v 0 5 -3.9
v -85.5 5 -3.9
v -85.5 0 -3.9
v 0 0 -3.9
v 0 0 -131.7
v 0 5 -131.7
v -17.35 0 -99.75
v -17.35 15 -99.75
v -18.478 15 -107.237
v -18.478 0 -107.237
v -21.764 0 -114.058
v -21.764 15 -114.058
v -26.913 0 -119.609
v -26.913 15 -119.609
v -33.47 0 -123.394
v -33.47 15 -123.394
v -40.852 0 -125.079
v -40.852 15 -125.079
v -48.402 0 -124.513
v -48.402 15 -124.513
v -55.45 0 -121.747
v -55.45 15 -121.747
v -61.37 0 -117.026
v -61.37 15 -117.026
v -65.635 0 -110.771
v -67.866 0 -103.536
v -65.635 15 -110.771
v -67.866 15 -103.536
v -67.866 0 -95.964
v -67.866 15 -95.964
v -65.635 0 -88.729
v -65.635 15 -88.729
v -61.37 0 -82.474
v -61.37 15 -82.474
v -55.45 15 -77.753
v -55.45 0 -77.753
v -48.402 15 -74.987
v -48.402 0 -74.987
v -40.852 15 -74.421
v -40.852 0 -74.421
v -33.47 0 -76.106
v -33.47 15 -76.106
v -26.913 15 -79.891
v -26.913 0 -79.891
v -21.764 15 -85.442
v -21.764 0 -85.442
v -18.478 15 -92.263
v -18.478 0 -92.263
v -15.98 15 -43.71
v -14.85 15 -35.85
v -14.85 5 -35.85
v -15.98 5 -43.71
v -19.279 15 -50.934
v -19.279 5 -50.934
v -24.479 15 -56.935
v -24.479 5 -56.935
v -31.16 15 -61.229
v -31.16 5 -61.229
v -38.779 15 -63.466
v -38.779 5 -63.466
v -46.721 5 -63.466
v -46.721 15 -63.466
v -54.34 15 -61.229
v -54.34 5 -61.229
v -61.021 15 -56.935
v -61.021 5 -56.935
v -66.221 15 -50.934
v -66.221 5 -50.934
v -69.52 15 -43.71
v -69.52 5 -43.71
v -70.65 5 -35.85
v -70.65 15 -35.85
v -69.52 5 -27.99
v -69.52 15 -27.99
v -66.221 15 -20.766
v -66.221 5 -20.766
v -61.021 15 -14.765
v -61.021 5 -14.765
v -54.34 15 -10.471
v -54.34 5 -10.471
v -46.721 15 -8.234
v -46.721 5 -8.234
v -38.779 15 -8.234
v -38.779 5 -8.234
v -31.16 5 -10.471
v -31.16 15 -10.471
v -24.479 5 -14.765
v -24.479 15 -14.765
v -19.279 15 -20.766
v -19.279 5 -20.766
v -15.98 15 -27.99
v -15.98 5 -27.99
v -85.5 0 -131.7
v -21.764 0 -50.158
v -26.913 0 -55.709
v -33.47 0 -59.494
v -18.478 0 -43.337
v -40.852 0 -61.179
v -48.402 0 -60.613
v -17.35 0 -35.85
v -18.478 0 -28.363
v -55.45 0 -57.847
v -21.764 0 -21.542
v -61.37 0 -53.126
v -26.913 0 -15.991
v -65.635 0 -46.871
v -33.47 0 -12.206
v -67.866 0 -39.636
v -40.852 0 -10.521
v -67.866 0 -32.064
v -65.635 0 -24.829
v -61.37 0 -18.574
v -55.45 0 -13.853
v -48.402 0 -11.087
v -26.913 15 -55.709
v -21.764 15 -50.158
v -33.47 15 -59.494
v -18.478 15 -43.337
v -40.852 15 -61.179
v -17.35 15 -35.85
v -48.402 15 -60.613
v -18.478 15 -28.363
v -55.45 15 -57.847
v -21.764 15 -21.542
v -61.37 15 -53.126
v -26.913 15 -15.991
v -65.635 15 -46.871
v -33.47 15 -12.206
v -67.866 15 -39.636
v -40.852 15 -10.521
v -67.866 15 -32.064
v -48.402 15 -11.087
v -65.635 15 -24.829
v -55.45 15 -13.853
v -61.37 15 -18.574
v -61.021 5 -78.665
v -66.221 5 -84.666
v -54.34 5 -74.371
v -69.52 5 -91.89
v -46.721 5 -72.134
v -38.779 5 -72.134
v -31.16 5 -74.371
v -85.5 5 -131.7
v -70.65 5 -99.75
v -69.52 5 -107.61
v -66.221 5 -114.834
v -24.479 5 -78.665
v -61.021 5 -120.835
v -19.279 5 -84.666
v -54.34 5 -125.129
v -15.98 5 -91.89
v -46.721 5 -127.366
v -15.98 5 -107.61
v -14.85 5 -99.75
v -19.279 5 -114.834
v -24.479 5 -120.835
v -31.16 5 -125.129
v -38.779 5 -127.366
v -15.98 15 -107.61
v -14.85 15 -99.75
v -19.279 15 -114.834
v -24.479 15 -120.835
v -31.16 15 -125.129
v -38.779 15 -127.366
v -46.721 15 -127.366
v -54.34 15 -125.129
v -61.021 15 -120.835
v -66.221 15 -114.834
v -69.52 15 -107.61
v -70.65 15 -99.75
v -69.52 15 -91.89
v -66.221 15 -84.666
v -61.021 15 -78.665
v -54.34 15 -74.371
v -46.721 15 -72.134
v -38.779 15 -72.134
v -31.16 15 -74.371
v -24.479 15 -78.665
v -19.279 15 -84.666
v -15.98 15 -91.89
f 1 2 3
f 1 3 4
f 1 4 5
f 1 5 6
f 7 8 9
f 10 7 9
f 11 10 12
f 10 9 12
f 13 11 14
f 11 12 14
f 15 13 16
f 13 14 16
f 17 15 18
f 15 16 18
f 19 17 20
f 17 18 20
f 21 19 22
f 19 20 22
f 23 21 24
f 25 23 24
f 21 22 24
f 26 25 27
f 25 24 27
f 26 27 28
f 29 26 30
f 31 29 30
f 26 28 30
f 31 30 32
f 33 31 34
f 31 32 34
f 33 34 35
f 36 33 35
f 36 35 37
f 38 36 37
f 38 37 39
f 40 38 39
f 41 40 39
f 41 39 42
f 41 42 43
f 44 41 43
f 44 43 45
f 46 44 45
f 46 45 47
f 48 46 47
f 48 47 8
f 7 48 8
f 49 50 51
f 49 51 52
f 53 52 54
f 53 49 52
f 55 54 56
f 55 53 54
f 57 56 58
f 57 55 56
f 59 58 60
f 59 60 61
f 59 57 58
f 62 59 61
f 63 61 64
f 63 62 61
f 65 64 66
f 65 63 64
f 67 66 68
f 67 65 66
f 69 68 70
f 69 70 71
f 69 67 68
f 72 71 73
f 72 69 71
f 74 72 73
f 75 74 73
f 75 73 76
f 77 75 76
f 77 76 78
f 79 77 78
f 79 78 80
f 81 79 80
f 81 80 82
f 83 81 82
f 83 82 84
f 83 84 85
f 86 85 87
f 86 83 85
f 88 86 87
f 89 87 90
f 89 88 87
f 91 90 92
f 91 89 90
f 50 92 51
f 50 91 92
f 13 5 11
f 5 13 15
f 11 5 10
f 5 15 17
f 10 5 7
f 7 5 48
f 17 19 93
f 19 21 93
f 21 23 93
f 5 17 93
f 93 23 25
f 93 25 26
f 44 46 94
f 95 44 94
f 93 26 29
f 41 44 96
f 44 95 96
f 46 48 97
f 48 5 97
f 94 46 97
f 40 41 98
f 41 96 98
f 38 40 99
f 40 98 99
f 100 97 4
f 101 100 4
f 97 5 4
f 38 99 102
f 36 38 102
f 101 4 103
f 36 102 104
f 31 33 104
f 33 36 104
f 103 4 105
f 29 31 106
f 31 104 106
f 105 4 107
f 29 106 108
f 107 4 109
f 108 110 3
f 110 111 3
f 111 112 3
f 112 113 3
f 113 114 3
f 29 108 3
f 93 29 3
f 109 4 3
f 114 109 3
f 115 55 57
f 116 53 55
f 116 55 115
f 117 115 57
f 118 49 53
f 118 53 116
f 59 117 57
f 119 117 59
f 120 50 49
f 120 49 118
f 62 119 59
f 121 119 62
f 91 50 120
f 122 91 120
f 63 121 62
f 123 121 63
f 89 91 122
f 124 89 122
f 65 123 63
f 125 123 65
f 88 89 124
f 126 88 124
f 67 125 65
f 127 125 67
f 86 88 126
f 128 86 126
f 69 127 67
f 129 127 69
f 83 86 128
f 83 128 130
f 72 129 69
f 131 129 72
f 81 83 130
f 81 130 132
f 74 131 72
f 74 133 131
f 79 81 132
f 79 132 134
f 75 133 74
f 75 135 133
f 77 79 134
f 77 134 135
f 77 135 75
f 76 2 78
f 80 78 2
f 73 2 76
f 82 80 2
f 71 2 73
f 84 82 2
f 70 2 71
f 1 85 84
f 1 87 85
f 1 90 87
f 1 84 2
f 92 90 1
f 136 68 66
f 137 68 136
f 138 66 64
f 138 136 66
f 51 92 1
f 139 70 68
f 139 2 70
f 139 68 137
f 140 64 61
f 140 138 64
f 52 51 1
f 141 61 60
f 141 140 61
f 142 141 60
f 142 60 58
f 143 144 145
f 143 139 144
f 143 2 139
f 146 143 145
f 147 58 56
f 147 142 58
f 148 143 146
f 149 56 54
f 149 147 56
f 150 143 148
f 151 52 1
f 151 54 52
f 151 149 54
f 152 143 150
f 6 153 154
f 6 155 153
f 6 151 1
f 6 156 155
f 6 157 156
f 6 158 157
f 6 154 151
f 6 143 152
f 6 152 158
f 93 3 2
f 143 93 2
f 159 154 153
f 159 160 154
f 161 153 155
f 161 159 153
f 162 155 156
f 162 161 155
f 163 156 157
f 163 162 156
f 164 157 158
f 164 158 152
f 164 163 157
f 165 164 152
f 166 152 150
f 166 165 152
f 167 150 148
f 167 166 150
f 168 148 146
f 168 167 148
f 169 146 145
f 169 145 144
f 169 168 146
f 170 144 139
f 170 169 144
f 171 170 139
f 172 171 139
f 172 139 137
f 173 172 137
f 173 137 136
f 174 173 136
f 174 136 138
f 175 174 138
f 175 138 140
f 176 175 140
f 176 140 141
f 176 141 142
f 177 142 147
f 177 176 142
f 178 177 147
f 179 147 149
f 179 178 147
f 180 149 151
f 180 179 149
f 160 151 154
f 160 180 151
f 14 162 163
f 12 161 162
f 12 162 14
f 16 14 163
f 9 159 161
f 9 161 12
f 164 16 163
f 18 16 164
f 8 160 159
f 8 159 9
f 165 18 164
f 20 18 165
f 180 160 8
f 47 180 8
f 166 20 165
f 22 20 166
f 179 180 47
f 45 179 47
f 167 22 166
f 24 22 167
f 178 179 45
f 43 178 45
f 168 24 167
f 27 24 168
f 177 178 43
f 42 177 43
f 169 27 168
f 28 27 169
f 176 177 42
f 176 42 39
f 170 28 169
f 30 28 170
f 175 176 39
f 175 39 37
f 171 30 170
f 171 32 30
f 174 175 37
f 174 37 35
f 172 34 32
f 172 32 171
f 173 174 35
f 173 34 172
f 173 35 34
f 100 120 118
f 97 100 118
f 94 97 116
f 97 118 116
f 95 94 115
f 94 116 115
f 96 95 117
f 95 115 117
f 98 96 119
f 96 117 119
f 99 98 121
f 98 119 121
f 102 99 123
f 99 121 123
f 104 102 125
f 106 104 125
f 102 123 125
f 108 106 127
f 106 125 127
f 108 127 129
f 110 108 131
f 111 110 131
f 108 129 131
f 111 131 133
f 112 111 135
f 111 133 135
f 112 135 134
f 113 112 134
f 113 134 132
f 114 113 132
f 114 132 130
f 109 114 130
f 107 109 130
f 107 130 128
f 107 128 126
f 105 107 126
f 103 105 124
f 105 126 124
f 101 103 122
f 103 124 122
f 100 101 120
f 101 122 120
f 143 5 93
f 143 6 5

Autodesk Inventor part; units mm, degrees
ref_plane "YZ Plane" through (0, 0, 0) normal (1, 0, 0) x (0, 1, 0)
ref_plane "XZ Plane" through (0, 0, 0) normal (0, 1, 0) x (-1, 0, 0)
ref_plane "XY Plane" through (0, 0, 0) normal (0, 0, 1) x (1, 0, 0)
sketch "Sketch1" plane through (0, 0, 0) normal (0, 1, 0) x (-1, 0, 0)
  point P0 (0, 0)
sketch "Sketch2" plane through (0, 0, 0) normal (0, 1, 0) x (-1, 0, 0)
  line L0 (0, 0) -> (85.5, 0)
  line L1 (85.5, 0) -> (85.5, -127.8)
  line L2 (85.5, -127.8) -> (0, -127.8)
  line L3 (0, -127.8) -> (0, 0)
  dimension "d0" = 85.5
  dimension "d1" = 127.8
extrude "Extrusion1" add sketch "Sketch2" along normal blind 5
sketch "Sketch3" plane through (0, 5, 0) normal (0, 1, 0) x (1, 0, 0)
  line L0 (-85.5, 127.8) -> (-85.5, 0) projected
  line L1 (-85.5, 0) -> (0, 0)
  line L2 (0, 0) -> (0, 127.8)
  line L3 (0, 127.8) -> (-85.5, 127.8)
  line L4 (-85.5, 127.8) -> (-85.5, 0)
  line L5 (-2.4, 2.4) -> (-83.1, 2.4)
  line L6 (-83.1, 2.4) -> (-83.1, 125.4)
  line L7 (-83.1, 125.4) -> (-2.4, 125.4)
  line L8 (-2.4, 125.4) -> (-2.4, 2.4)
  dimension "d6" = 80.7
  dimension "d7" = 123
extrude "Extrusion2" add sketch "Sketch3" along normal blind 120
sketch "Sketch4" plane through (0, 0, 0) normal (1, 0, 0) x (0, 0, -1)
  line L0 (10, 10) -> (117.8, 10)
  line L1 (117.8, 10) -> (117.8, 115)
  line L2 (117.8, 115) -> (10, 115)
  line L3 (10, 115) -> (10, 10)
  point P0 (0, 0)
  dimension "d10" = 107.8
  dimension "d11" = 105
extrude "Extrusion3" cut sketch "Sketch4" against normal blind 500
sketch "Sketch5" plane through (0, 0, -127.8) normal (0, 0, -1) x (-1, 0, 0)
  line L0 (10, 10) -> (75.5, 10)
  line L1 (75.5, 10) -> (75.5, 115)
  line L2 (75.5, 115) -> (10, 115)
  line L3 (10, 115) -> (10, 10)
  point P0 (0, 0)
  dimension "d14" = 65.5
  dimension "d15" = 105
extrude "Extrusion4" cut sketch "Sketch5" against normal blind 500
sketch "Sketch6" plane through (-85.5, 0, -127.8) normal (-1, 0, 0) x (0, 0, 1)
  line L0 (2.4, 125) -> (125.4, 125) projected
  line L1 (63.9, 125) -> (63.9, 0)
  line L2 (0, 0) -> (127.8, 0) projected
  line L3 (63.9, 125) -> (58.9, 125)
  line L4 (58.9, 125) -> (58.9, 0)
  line L5 (58.9, 0) -> (63.9, 0)
  line L6 (63.9, 0) -> (63.9, 125)
  line L7 (63.9, 125) -> (68.9, 125)
  line L8 (68.9, 125) -> (68.9, 0)
  line L9 (68.9, 0) -> (63.9, 0)
  line L10 (63.9, 0) -> (63.9, 125)
  dimension "d18" = 5
  dimension "d19" = 5
extrude "Extrusion5" add sketch "Sketch6" against normal blind 2.4
sketch "Sketch7" plane through (0, 0, 0) normal (1, 0, 0) x (0, 0, -1)
  line L0 (117.8, 115) -> (10, 115) projected
  line L1 (63.9, 115) -> (63.9, 10)
  line L2 (10, 10) -> (117.8, 10) projected
  line L3 (58.9, 10) -> (58.9, 115) projected
  line L4 (117.8, 10) -> (68.9, 10) projected
  line L5 (58.9, 115) -> (68.9, 115)
  line L6 (68.9, 115) -> (68.9, 10)
  line L7 (68.9, 10) -> (58.9, 10)
  line L8 (58.9, 10) -> (58.9, 115)
  point P0 (0, 0)
extrude "Extrusion6" add sketch "Sketch7" against normal blind 2.4
sketch "Sketch8" plane through (0, 0, -127.8) normal (0, 0, -1) x (-1, 0, 0)
  line L0 (10, 100) -> (25, 115)
  line L1 (10, 115) -> (75.5, 115) projected
  line L2 (10, 100) -> (31.2132, 100) construction
  line L3 (75.5, 100) -> (60.5, 115)
  line L4 (75.5, 100) -> (96.7132, 100) construction
  line L5 (10, 10) -> (10, 115) projected
  line L6 (10, 25) -> (25, 10)
  line L7 (10, 10) -> (75.5, 10) projected
  line L8 (10, 25) -> (31.2132, 25) construction
  line L9 (75.5, 115) -> (75.5, 10) projected
  line L10 (75.5, 25) -> (60.5, 10)
  line L11 (10, 115) -> (75.5, 115)
  line L12 (75.5, 115) -> (75.5, 10)
  line L13 (75.5, 10) -> (10, 10)
  line L14 (10, 10) -> (10, 115)
  point P0 (0, 0)
  dimension "d24" = 45
  dimension "d25" = 135
  dimension "d26" = 45
extrude "Extrusion7" add sketch "Sketch8" against normal blind 2.4 contours L5 L1 L0 | L6 L7 L5 | L1 L9 L3 | L10 L9 L7
sketch "Sketch9" plane through (-85.5, 0, 0) normal (0, 0, 1) x (1, 0, 0)
  line L0 (10, 25) -> (10, 100) projected
  line L1 (25, 115) -> (60.5, 115) projected
  line L2 (10, 100) -> (25, 115)
  line L3 (60.5, 115) -> (75.5, 100) projected
  line L4 (25, 115) -> (60.5, 115)
  line L5 (60.5, 115) -> (75.5, 100)
  line L6 (75.5, 100) -> (75.5, 25) projected
  line L7 (75.5, 100) -> (75.5, 25)
  line L8 (75.5, 25) -> (60.5, 10)
  line L9 (25, 10) -> (60.5, 10) projected
  line L10 (10, 25) -> (25, 10) projected
  line L11 (25, 10) -> (10, 25)
  line L12 (10, 25) -> (10, 100)
  line L13 (10, 115) -> (75.5, 115)
  line L14 (75.5, 115) -> (75.5, 10)
  line L15 (75.5, 10) -> (10, 10)
  line L16 (10, 10) -> (10, 115)
  point P0 (85.5, 0)
  point P1 (60.5, 10)
extrude "Extrusion8" add sketch "Sketch9" against normal blind 2.4 contours L10 L15 L16 | L16 L13 L2 | L8 L14 L15 | L13 L14 L3
sketch "Sketch10" plane through (0, 0, 0) normal (1, 0, 0) x (0, 0, -1)
  line L0 (10, 115) -> (10, 10) projected
  line L1 (10, 100) -> (25, 115)
  line L2 (58.9, 115) -> (10, 115) projected
  line L3 (10, 100) -> (31.2132, 100) construction
  line L4 (58.9, 10) -> (58.9, 115) projected
  line L5 (58.9, 100) -> (43.9, 115)
  line L6 (58.9, 25) -> (43.9, 10)
  line L7 (10, 10) -> (58.9, 10) projected
  line L8 (10, 25) -> (25, 10)
  line L9 (68.9, 100) -> (83.9, 115)
  line L10 (68.9, 115) -> (117.8, 115) projected
  line L11 (68.9, 100) -> (90.1132, 100) construction
  line L12 (117.8, 115) -> (117.8, 10) projected
  line L13 (117.8, 100) -> (102.8, 115)
  line L14 (117.8, 25) -> (102.8, 10)
  line L15 (117.8, 10) -> (68.9, 10) projected
  line L16 (68.9, 25) -> (83.9, 10)
  line L17 (10, 115) -> (58.9, 115)
  line L18 (58.9, 115) -> (58.9, 10)
  line L19 (58.9, 10) -> (10, 10)
  line L20 (10, 10) -> (10, 115)
  line L21 (68.9, 115) -> (117.8, 115)
  line L22 (117.8, 115) -> (117.8, 10)
  line L23 (117.8, 10) -> (68.9, 10)
  line L24 (68.9, 10) -> (68.9, 115)
  point P0 (0, 0)
  dimension "d31" = 45
  dimension "d32" = 45
extrude "Extrusion9" add sketch "Sketch10" against normal blind 2.4 contours L2 L1 L0 | L8 L7 L0 | L2 L4 L5 | L6 L4 L7 | L24 L10 L9 | L16 L15 L24 | L10 L12 L13 | L14 L12 L15
sketch "Sketch11" plane through (-85.5, 0, -127.8) normal (-1, 0, 0) x (0, 0, 1)
  line L0 (10, 100) -> (25, 115) projected
  line L1 (10, 100) -> (25, 115)
  line L2 (25, 115) -> (43.9, 115) projected
  line L3 (25, 115) -> (43.9, 115)
  line L4 (43.9, 115) -> (58.9, 100)
  line L5 (58.9, 100) -> (58.9, 25)
  line L6 (58.9, 25) -> (43.9, 10) projected
  line L7 (10, 10) -> (58.9, 10) projected
  line L8 (25, 10) -> (10, 25) projected
  line L9 (43.9, 10) -> (25, 10)
  line L10 (25, 10) -> (10, 25)
  line L11 (10, 25) -> (10, 100)
  line L12 (10, 115) -> (10, 10) projected
  line L13 (68.9, 25) -> (68.9, 100) projected
  line L14 (83.9, 115) -> (102.8, 115) projected
  line L15 (68.9, 100) -> (83.9, 115)
  line L16 (83.9, 115) -> (102.8, 115)
  line L17 (102.8, 115) -> (117.8, 100)
  line L18 (117.8, 25) -> (102.8, 10) projected
  line L19 (117.8, 100) -> (117.8, 25)
  line L20 (117.8, 25) -> (102.8, 10)
  line L21 (83.9, 10) -> (102.8, 10) projected
  line L22 (102.8, 10) -> (83.9, 10)
  line L23 (83.9, 10) -> (68.9, 25)
  line L24 (68.9, 25) -> (68.9, 100)
  line L25 (10, 115) -> (58.9, 115)
  line L26 (58.9, 115) -> (58.9, 10)
  line L27 (58.9, 10) -> (10, 10)
  line L28 (10, 10) -> (10, 115)
  line L29 (68.9, 115) -> (117.8, 115)
  line L30 (117.8, 115) -> (117.8, 10)
  line L31 (117.8, 10) -> (68.9, 10)
  line L32 (68.9, 10) -> (68.9, 115)
  point P0 (127.8, 0)
extrude "Extrusion10" add sketch "Sketch11" against normal blind 2.4 contours L12 L25 L0 | L8 L7 L12 | L25 L26 L4 | L6 L26 L7 | L23 L31 L32 | L32 L29 L15 | L18 L30 L31 | L29 L30 L17
sketch "Sketch12" plane through (0, 125, 0) normal (0, 1, 0) x (1, 0, 0)
  line L0 (-83.1, 125.4) -> (-2.4, 125.4) projected
  line L1 (-83.1, 125.4) -> (-83.1, 2.4) projected
  line L2 (-2.4, 125.4) -> (-83.1, 125.4)
  line L3 (-83.1, 125.4) -> (-83.1, 2.4)
  line L4 (-83.1, 2.4) -> (-2.4, 2.4)
  line L5 (-2.4, 2.4) -> (-2.4, 125.4)
  point P0 (0, 0)
extrude "Extrusion11" add sketch "Sketch12" against normal blind 4.8
sketch "Sketch13" plane through (0, 125, 0) normal (0, 1, 0) x (1, 0, 0)
  line L0 (-2.4, 2.4) -> (-2.4, 125.4) projected
  line L1 (-83.1, 125.4) -> (-83.1, 2.4) projected
  line L2 (-2.4, 125.4) -> (-83.1, 125.4)
  line L3 (-83.1, 125.4) -> (-83.1, 2.4)
  line L4 (-83.1, 2.4) -> (-2.4, 2.4)
  line L5 (-2.4, 2.4) -> (-2.4, 125.4)
  point P0 (0, 0)
extrude "Extrusion12" cut sketch "Sketch13" against normal blind 2.4
sketch "Sketch14" plane through (0, 122.6, 0) normal (0, 1, 0) x (1, 0, 0)
  line L0 (-80.1, 122.4) -> (-5.4, 122.4)
  line L1 (-5.4, 122.4) -> (-5.4, 5.4)
  line L2 (-5.4, 5.4) -> (-80.1, 5.4)
  line L3 (-80.1, 5.4) -> (-80.1, 122.4)
  point P0 (0, 0)
  dimension "d41" = 74.7
  dimension "d42" = 117
extrude "Extrusion13" cut sketch "Sketch14" against normal blind 10
sketch "Sketch15" plane through (0, 0, 0) normal (1, 0, 0) x (0, 0, -1)
  line L0 (127.8, 0) -> (127.8, 125) projected
  line L1 (0, 125) -> (127.8, 125)
  line L2 (127.8, 125) -> (127.8, 119)
  line L3 (127.8, 119) -> (0, 119)
  line L4 (0, 119) -> (0, 125)
  line L5 (127.8, 125) -> (0, 125) projected
  line L6 (63.9, 125) -> (88.9, 125)
  line L7 (88.9, 125) -> (88.9, 119)
  line L8 (88.9, 119) -> (63.9, 119)
  line L9 (63.9, 119) -> (63.9, 125)
  line L10 (63.9, 125) -> (38.9, 125)
  line L11 (38.9, 125) -> (38.9, 119)
  line L12 (38.9, 119) -> (63.9, 119)
  line L13 (63.9, 119) -> (63.9, 125)
  point P0 (0, 0)
  dimension "d45" = 6
  dimension "d46" = 25
  dimension "d47" = 25
extrude "Extrusion14" cut sketch "Sketch15" against normal blind 100 contours L3 L9 L1 L7 | L3 L11 L1 L9
sketch "Sketch16" plane through (0, 0, -127.8) normal (0, 0, -1) x (-1, 0, 0)
  line L0 (0, 125) -> (0, 119) projected
  line L1 (85.5, 0) -> (85.5, 125) projected
  line L2 (0, 125) -> (85.5, 125)
  line L3 (85.5, 125) -> (85.5, 119)
  line L4 (85.5, 119) -> (0, 119)
  line L5 (0, 119) -> (0, 125)
  line L6 (0, 125) -> (85.5, 125) projected
  line L7 (42.75, 125) -> (67.75, 125)
  line L8 (67.75, 125) -> (67.75, 119)
  line L9 (67.75, 119) -> (42.75, 119)
  line L10 (42.75, 119) -> (42.75, 125)
  line L11 (42.75, 125) -> (17.75, 125)
  line L12 (17.75, 125) -> (17.75, 119)
  line L13 (17.75, 119) -> (42.75, 119)
  line L14 (42.75, 119) -> (42.75, 125)
  point P0 (0, 0)
  dimension "d50" = 6
  dimension "d51" = 25
  dimension "d52" = 25
extrude "Extrusion15" cut sketch "Sketch16" against normal blind 200 contours L2 L10 L4 L12 | L2 L8 L4 L10
sketch "Sketch17" plane through (-85.5, 0, 0) normal (0, 0, 1) x (1, 0, 0)
  line L0 (17.75, 119) -> (67.75, 119)
  line L1 (67.75, 119) -> (67.75, 118)
  line L2 (67.75, 118) -> (17.75, 118)
  line L3 (17.75, 118) -> (17.75, 119)
  point P0 (85.5, 0)
  dimension "d55" = 1
extrude "Extrusion16" cut sketch "Sketch17" against normal blind 200
sketch "Sketch18" plane through (0, 0, 0) normal (1, 0, 0) x (0, 0, -1)
  line L0 (38.9, 119) -> (38.9, 120.2) projected
  line L1 (38.9, 119) -> (88.9, 119)
  line L2 (88.9, 119) -> (88.9, 118)
  line L3 (88.9, 118) -> (38.9, 118)
  line L4 (38.9, 118) -> (38.9, 119)
  point P0 (0, 0)
  dimension "d58" = 1
extrude "Extrusion17" cut sketch "Sketch18" against normal blind 200
sketch "Sketch19" plane through (0, 0, -127.8) normal (0, 0, -1) x (-1, 0, 0)
  line L0 (17.75, 118) -> (67.75, 118) projected
  line L1 (17.75, 118) -> (67.75, 118)
  line L2 (67.75, 118) -> (67.75, 112)
  line L3 (67.75, 112) -> (17.75, 112)
  line L4 (17.75, 112) -> (17.75, 118)
  point P0 (0, 0)
  dimension "d61" = 50
  dimension "d62" = 6
extrude "Extrusion18" add sketch "Sketch19" against normal blind 2.4
sketch "Sketch20" plane through (-85.5, 0, -127.8) normal (-1, 0, 0) x (0, 0, 1)
  line L0 (2.4, 118) -> (0, 118) projected
  line L1 (127.8, 100) -> (127.8, 115) projected
  line L2 (0, 118) -> (127.8, 118)
  line L3 (127.8, 118) -> (127.8, 112)
  line L4 (127.8, 112) -> (0, 112)
  line L5 (0, 112) -> (0, 118)
  point P0 (127.8, 0)
  dimension "d65" = 6
extrude "Extrusion19" add sketch "Sketch20" against normal blind 2.4
sketch "Sketch21" plane through (-85.5, 0, 0) normal (0, 0, 1) x (1, 0, 0)
  line L0 (17.75, 118) -> (67.75, 118) projected
  line L1 (17.75, 118) -> (67.75, 118)
  line L2 (67.75, 118) -> (67.75, 112)
  line L3 (67.75, 112) -> (17.75, 112)
  line L4 (17.75, 112) -> (17.75, 118)
  point P0 (85.5, 0)
  dimension "d68" = 6
extrude "Extrusion20" add sketch "Sketch21" against normal blind 2.4
sketch "Sketch22" plane through (0, 0, 0) normal (1, 0, 0) x (0, 0, -1)
  line L0 (127.8, 0) -> (127.8, 125) projected
  line L1 (0, 118) -> (127.8, 118)
  line L2 (127.8, 118) -> (127.8, 112)
  line L3 (127.8, 112) -> (0, 112)
  line L4 (0, 112) -> (0, 118)
  point P0 (0, 0)
  dimension "d71" = 6
extrude "Extrusion21" add sketch "Sketch22" against normal blind 2.4
sketch "Sketch23" plane through (0, 125, 0) normal (0, 1, 0) x (1, 0, 0)
  line L0 (-85.5, 127.8) -> (-85.5, 0) projected
  line L1 (-85.5, 127.8) -> (0, 127.8)
  line L2 (0, 127.8) -> (0, 0)
  line L3 (0, 0) -> (-85.5, 0)
  line L4 (-85.5, 0) -> (-85.5, 127.8)
extrude "Extrusion22" cut sketch "Sketch23" against normal blind 120
sketch "Sketch24" plane through (0, 5, 0) normal (0, 1, 0) x (1, 0, 0)
  line L0 (0, 127.8) -> (-85.5, 127.8) projected
  line L1 (-42.75, 127.8) -> (-42.75, 0)
  line L2 (-85.5, 0) -> (0, 0) projected
  line L3 (-85.5, 127.8) -> (-85.5, 0) projected
  line L4 (-85.5, 63.9) -> (0, 63.9)
  line L5 (0, 0) -> (0, 127.8) projected
  line L6 (-42.75, 63.9) -> (-36.25, 63.9)
  line L7 (-36.25, 63.9) -> (-36.25, 70.4)
  line L8 (-36.25, 70.4) -> (-42.75, 70.4)
  line L9 (-42.75, 70.4) -> (-42.75, 63.9)
  line L10 (-36.25, 70.4) -> (-49.25, 70.4)
  line L11 (-49.25, 70.4) -> (-49.25, 57.4)
  line L12 (-49.25, 57.4) -> (-36.25, 57.4)
  line L13 (-36.25, 57.4) -> (-36.25, 70.4)
  line L14 (-42.75, 63.9) -> (-34.75, 63.9)
  line L15 (-34.75, 63.9) -> (-34.75, 71.9)
  line L16 (-34.75, 71.9) -> (-42.75, 71.9)
  line L17 (-42.75, 71.9) -> (-42.75, 63.9)
  line L18 (-34.75, 71.9) -> (-50.75, 71.9)
  line L19 (-50.75, 71.9) -> (-50.75, 55.9)
  line L20 (-50.75, 55.9) -> (-34.75, 55.9)
  line L21 (-34.75, 55.9) -> (-34.75, 71.9)
  dimension "d76" = 6.5
  dimension "d77" = 6.5
  dimension "d78" = 13
  dimension "d79" = 13
  dimension "d80" = 8
  dimension "d81" = 8
  dimension "d82" = 16
  dimension "d83" = 16
extrude "Extrusion23" add sketch "Sketch24" along normal blind 25 contours L16 L15 L4 L7 L8 L1 | L1 L10 L11 L4 L19 L18 | L21 L20 L1 L12 L13 L4 | L4 L11 L12 L1 L20 L19
sketch "Sketch26" plane through (0, 30, 0) normal (0, 1, 0) x (1, 0, 0)
  line L0 (-60.75, 81.9) -> (-60.75, 68.9) projected
  line L1 (-24.75, 45.9) -> (-37.75, 45.9) projected
  line L2 (-60.75, 81.9) -> (-24.75, 81.9)
  line L3 (-24.75, 81.9) -> (-24.75, 45.9)
  line L4 (-24.75, 45.9) -> (-60.75, 45.9)
  line L5 (-60.75, 45.9) -> (-60.75, 81.9)
  point P0 (0, 0)
extrude "Extrusion25" cut sketch "Sketch26" against normal blind 25
sketch "Sketch27" plane through (0, 5, 0) normal (0, 1, 0) x (1, 0, 0)
  line L0 (0, 127.8) -> (-85.5, 127.8) projected
  line L1 (-85.5, 127.8) -> (0, 127.8)
  line L2 (0, 127.8) -> (0, 0)
  line L3 (0, 0) -> (-85.5, 0)
  line L4 (-85.5, 0) -> (-85.5, 127.8)
  line L5 (-42.75, 127.8) -> (-42.75, 0)
  line L6 (0, 0) -> (0, 127.8) projected
  line L7 (-85.5, 127.8) -> (0, 127.8)
  line L8 (0, 127.8) -> (0, 117.8)
  line L9 (0, 117.8) -> (-85.5, 117.8)
  line L10 (-85.5, 117.8) -> (-85.5, 127.8)
  line L11 (-85.5, 127.8) -> (-85.5, 0) projected
  line L12 (0, 117.8) -> (-85.5, 117.8)
  line L13 (-85.5, 117.8) -> (-85.5, 97.8)
  line L14 (-85.5, 97.8) -> (0, 97.8)
  line L15 (0, 97.8) -> (0, 117.8)
  line L16 (-85.5, 97.8) -> (0, 97.8)
  line L17 (0, 97.8) -> (0, 77.8)
  line L18 (0, 77.8) -> (-85.5, 77.8)
  line L19 (-85.5, 77.8) -> (-85.5, 97.8)
  line L20 (-85.5, 77.8) -> (0, 77.8)
  line L21 (0, 77.8) -> (0, 57.8)
  line L22 (0, 57.8) -> (-85.5, 57.8)
  line L23 (-85.5, 57.8) -> (-85.5, 77.8)
  line L24 (-85.5, 57.8) -> (0, 57.8)
  line L25 (0, 57.8) -> (0, 37.8)
  line L26 (0, 37.8) -> (-85.5, 37.8)
  line L27 (-85.5, 37.8) -> (-85.5, 57.8)
  line L28 (-85.5, 37.8) -> (0, 37.8)
  line L29 (0, 37.8) -> (0, 17.8)
  line L30 (0, 17.8) -> (-85.5, 17.8)
  line L31 (-85.5, 17.8) -> (-85.5, 37.8)
  line L32 (-85.5, 127.8) -> (-42.75, 127.8)
  line L33 (0, 127.8) -> (-42.75, 127.8)
  line L34 (-64.125, 127.8) -> (-64.125, 0)
  line L35 (-85.5, 0) -> (0, 0) projected
  line L36 (-21.375, 127.8) -> (-21.375, 0)
  line L37 (-62.625, 127.8) -> (-65.625, 127.8)
  line L38 (-65.625, 127.8) -> (-65.625, 0)
  line L39 (-65.625, 0) -> (-62.625, 0)
  line L40 (-62.625, 0) -> (-62.625, 127.8)
  line L41 (-41.25, 127.8) -> (-44.25, 127.8)
  line L42 (-44.25, 127.8) -> (-44.25, 0)
  line L43 (-44.25, 0) -> (-41.25, 0)
  line L44 (-41.25, 0) -> (-41.25, 127.8)
  line L45 (-19.875, 127.8) -> (-22.875, 127.8)
  line L46 (-22.875, 127.8) -> (-22.875, 0)
  line L47 (-22.875, 0) -> (-19.875, 0)
  line L48 (-19.875, 0) -> (-19.875, 127.8)
  line L49 (-85.5, 117.8) -> (0, 117.8)
  line L50 (0, 117.8) -> (0, 120.8)
  line L51 (0, 120.8) -> (-85.5, 120.8)
  line L52 (-85.5, 120.8) -> (-85.5, 117.8)
  line L53 (-85.5, 120.8) -> (0, 120.8)
  line L54 (0, 120.8) -> (0, 114.8)
  line L55 (0, 114.8) -> (-85.5, 114.8)
  line L56 (-85.5, 114.8) -> (-85.5, 120.8)
  line L57 (-85.5, 97.8) -> (0, 97.8)
  line L58 (0, 97.8) -> (0, 100.8)
  line L59 (0, 100.8) -> (-85.5, 100.8)
  line L60 (-85.5, 100.8) -> (-85.5, 97.8)
  line L61 (0, 97.8) -> (-85.5, 97.8)
  line L62 (-85.5, 97.8) -> (-85.5, 94.8)
  line L63 (-85.5, 94.8) -> (0, 94.8)
  line L64 (0, 94.8) -> (0, 97.8)
  line L65 (-85.5, 77.8) -> (0, 77.8)
  line L66 (0, 77.8) -> (0, 80.8)
  line L67 (0, 80.8) -> (-85.5, 80.8)
  line L68 (-85.5, 80.8) -> (-85.5, 77.8)
  line L69 (0, 80.8) -> (-85.5, 80.8)
  line L70 (-85.5, 80.8) -> (-85.5, 74.8)
  line L71 (-85.5, 74.8) -> (0, 74.8)
  line L72 (0, 74.8) -> (0, 80.8)
  line L73 (-85.5, 57.8) -> (0, 57.8)
  line L74 (0, 57.8) -> (0, 60.8)
  line L75 (0, 60.8) -> (-85.5, 60.8)
  line L76 (-85.5, 60.8) -> (-85.5, 57.8)
  line L77 (0, 60.8) -> (-85.5, 60.8)
  line L78 (-85.5, 60.8) -> (-85.5, 54.8)
  line L79 (-85.5, 54.8) -> (0, 54.8)
  line L80 (0, 54.8) -> (0, 60.8)
  line L81 (-85.5, 37.8) -> (0, 37.8)
  line L82 (0, 37.8) -> (0, 40.8)
  line L83 (0, 40.8) -> (-85.5, 40.8)
  line L84 (-85.5, 40.8) -> (-85.5, 37.8)
  line L85 (-85.5, 40.8) -> (0, 40.8)
  line L86 (0, 40.8) -> (0, 34.8)
  line L87 (0, 34.8) -> (-85.5, 34.8)
  line L88 (-85.5, 34.8) -> (-85.5, 40.8)
  line L89 (-85.5, 17.8) -> (0, 17.8)
  line L90 (0, 17.8) -> (0, 20.8)
  line L91 (0, 20.8) -> (-85.5, 20.8)
  line L92 (-85.5, 20.8) -> (-85.5, 17.8)
  line L93 (0, 20.8) -> (-85.5, 20.8)
  line L94 (-85.5, 20.8) -> (-85.5, 14.8)
  line L95 (-85.5, 14.8) -> (0, 14.8)
  line L96 (0, 14.8) -> (0, 20.8)
  point P0 (-22.875, 20.8)
  point P1 (-22.875, 17.8)
  point P2 (-19.875, 17.8)
  point P3 (-19.875, 20.8)
  point P4 (-44.25, 20.8)
  point P5 (-44.25, 14.8)
  point P6 (-41.25, 14.8)
  point P7 (-41.25, 20.8)
  point P8 (-65.625, 20.8)
  point P9 (-65.625, 14.8)
  point P10 (-62.625, 14.8)
  point P11 (-62.625, 20.8)
  point P12 (-19.875, 40.8)
  point P13 (-22.875, 40.8)
  point P14 (-22.875, 34.8)
  point P15 (-19.875, 34.8)
  point P16 (-41.25, 40.8)
  point P17 (-44.25, 40.8)
  point P18 (-44.25, 34.8)
  point P19 (-41.25, 34.8)
  point P20 (-62.625, 40.8)
  point P21 (-65.625, 40.8)
  point P22 (-65.625, 34.8)
  point P23 (-62.625, 34.8)
  point P24 (-22.875, 60.8)
  point P25 (-22.875, 54.8)
  point P26 (-19.875, 54.8)
  point P27 (-19.875, 60.8)
  point P28 (-44.25, 60.8)
  point P29 (-44.25, 54.8)
  point P30 (-41.25, 54.8)
  point P31 (-41.25, 60.8)
  point P32 (-65.625, 60.8)
  point P33 (-65.625, 54.8)
  point P34 (-62.625, 54.8)
  point P35 (-62.625, 60.8)
  point P36 (-44.25, 80.8)
  point P37 (-44.25, 74.8)
  point P38 (-41.25, 74.8)
  point P39 (-41.25, 80.8)
  point P40 (-62.625, 80.8)
  point P41 (-65.625, 80.8)
  point P42 (-65.625, 74.8)
  point P43 (-62.625, 74.8)
  point P44 (-19.875, 80.8)
  point P45 (-22.875, 80.8)
  point P46 (-22.875, 74.8)
  point P47 (-19.875, 74.8)
  point P48 (-19.875, 100.8)
  point P49 (-22.875, 100.8)
  point P50 (-22.875, 94.8)
  point P51 (-19.875, 94.8)
  point P52 (-41.25, 94.8)
  point P53 (-41.25, 100.8)
  point P54 (-44.25, 100.8)
  point P55 (-44.25, 94.8)
  point P56 (-65.625, 100.8)
  point P57 (-65.625, 94.8)
  point P58 (-62.625, 94.8)
  point P59 (-62.625, 100.8)
  point P60 (-19.875, 120.8)
  point P61 (-22.875, 120.8)
  point P62 (-22.875, 114.8)
  point P63 (-19.875, 114.8)
  point P64 (-41.25, 120.8)
  point P65 (-44.25, 120.8)
  point P66 (-44.25, 114.8)
  point P67 (-41.25, 114.8)
  point P68 (-62.625, 120.8)
  point P69 (-65.625, 120.8)
  point P70 (-65.625, 114.8)
  point P71 (-62.625, 114.8)
  dimension "d100" = 10
  dimension "d101" = 20
  dimension "d102" = 20
  dimension "d103" = 20
  dimension "d104" = 20
  dimension "d105" = 20
  dimension "d106" = 3
  dimension "d107" = 3
  dimension "d108" = 3
  dimension "d109" = 3
  dimension "d110" = 6
  dimension "d111" = 3
  dimension "d112" = 3
  dimension "d113" = 3
  dimension "d114" = 6
  dimension "d115" = 3
  dimension "d116" = 85.5
  dimension "d117" = 6
  dimension "d118" = 3
  dimension "d119" = 6
  dimension "d120" = 3
  dimension "d121" = 6
extrude "Extrusion26" cut sketch "Sketch27" against normal blind 5 contours L48 L9 L36 L51 | L36 L9 L46 L51 | L48 L55 L36 L9 | L36 L55 L46 L9 | L44 L9 L5 L51 | L48 L14 L36 L59 | L5 L9 L42 L51 | L44 L55 L5 L9 | L36 L14 L46 L59 | L48 L63 L36 L14 | L5 L55 L42 L9 | L36 L63 L46 L14 | L40 L9 L34 L51 | L44 L14 L5 L59 | L48 L18 L36 L67 | L34 L9 L38 L51 | L40 L55 L34 L9 | L5 L14 L42 L59 | L44 L63 L5 L14 | L36 L18 L46 L67 | L48 L71 L36 L18 | L34 L55 L38 L9 | L5 L63 L42 L14 | L36 L71 L46 L18 | L40 L14 L34 L59 | L44 L18 L5 L67 | L48 L22 L36 L75 | L34 L14 L38 L59 | L40 L63 L34 L14 | L5 L18 L42 L67 | L44 L71 L5 L18 | L36 L22 L46 L75 | L48 L79 L36 L22 | L34 L63 L38 L14 | L5 L71 L42 L18 | L36 L79 L46 L22 | L40 L18 L34 L67 | L44 L22 L5 L75 | L48 L26 L36 L83 | L34 L18 L38 L67 | L40 L71 L34 L18 | L5 L22 L42 L75 | L44 L79 L5 L22 | L36 L26 L46 L83 | L48 L87 L36 L26 | L34 L71 L38 L18 | L5 L79 L42 L22 | L36 L87 L46 L26 | L40 L22 L34 L75 | L44 L26 L5 L83 | L48 L30 L36 L91 | L34 L22 L38 L75 | L40 L79 L34 L22 | L5 L26 L42 L83 | L44 L87 L5 L26 | L36 L30 L46 L91 | L34 L79 L38 L22 | L5 L87 L42 L26 | L40 L26 L34 L83 | L44 L30 L5 L91 | L34 L26 L38 L83 | L40 L87 L34 L26 | L5 L30 L42 L91 | L44 L95 L5 L30 | L34 L87 L38 L26 | L5 L95 L42 L30 | L40 L30 L34 L91 | L34 L30 L38 L91 | L40 L95 L34 L30 | L34 L95 L38 L30
sketch "Sketch28" plane through (0, 5, 0) normal (0, 1, 0) x (1, 0, 0)
  line L0 (-22.875, 17.8) -> (-19.875, 17.8) projected
  line L1 (-19.875, 17.8) -> (-22.875, 17.8)
  line L2 (-22.875, 17.8) -> (-22.875, 14.8)
  line L3 (-22.875, 14.8) -> (-19.875, 14.8)
  line L4 (-19.875, 14.8) -> (-19.875, 17.8)
  point P0 (0, 0)
  dimension "d124" = 3
  dimension "d125" = 3
extrude "Extrusion27" cut sketch "Sketch28" against normal blind 5
sketch "Sketch29" plane through (0, 5, 0) normal (0, 1, 0) x (1, 0, 0)
  line L0 (-22.875, 14.8) -> (-22.875, 20.8) projected
  line L1 (-22.875, 20.8) -> (-19.875, 20.8) projected
  line L2 (-19.875, 20.8) -> (-19.875, 14.8) projected
  line L3 (-19.875, 14.8) -> (-22.875, 14.8) projected
  line L4 (-19.875, 114.8) -> (-22.875, 114.8) projected
  line L5 (-22.875, 114.8) -> (-22.875, 120.8) projected
  line L6 (-22.875, 120.8) -> (-19.875, 120.8) projected
  line L7 (-19.875, 120.8) -> (-19.875, 114.8) projected
  line L8 (-19.875, 74.8) -> (-22.875, 74.8) projected
  line L9 (-22.875, 74.8) -> (-22.875, 80.8) projected
  line L10 (-22.875, 80.8) -> (-19.875, 80.8) projected
  line L11 (-19.875, 80.8) -> (-19.875, 74.8) projected
  line L12 (-41.25, 54.8) -> (-44.25, 54.8) projected
  line L13 (-44.25, 54.8) -> (-44.25, 60.8) projected
  line L14 (-44.25, 60.8) -> (-41.25, 60.8) projected
  line L15 (-41.25, 60.8) -> (-41.25, 54.8) projected
  line L16 (-19.875, 34.8) -> (-22.875, 34.8) projected
  line L17 (-22.875, 34.8) -> (-22.875, 40.8) projected
  line L18 (-22.875, 40.8) -> (-19.875, 40.8) projected
  line L19 (-19.875, 40.8) -> (-19.875, 34.8) projected
  line L20 (-41.25, 34.8) -> (-44.25, 34.8) projected
  line L21 (-44.25, 34.8) -> (-44.25, 40.8) projected
  line L22 (-44.25, 40.8) -> (-41.25, 40.8) projected
  line L23 (-41.25, 40.8) -> (-41.25, 34.8) projected
  line L24 (-62.625, 54.8) -> (-65.625, 54.8) projected
  line L25 (-65.625, 54.8) -> (-65.625, 60.8) projected
  line L26 (-65.625, 60.8) -> (-62.625, 60.8) projected
  line L27 (-62.625, 60.8) -> (-62.625, 54.8) projected
  line L28 (-19.875, 94.8) -> (-22.875, 94.8) projected
  line L29 (-22.875, 94.8) -> (-22.875, 100.8) projected
  line L30 (-22.875, 100.8) -> (-19.875, 100.8) projected
  line L31 (-19.875, 100.8) -> (-19.875, 94.8) projected
  line L32 (-41.25, 114.8) -> (-44.25, 114.8) projected
  line L33 (-44.25, 114.8) -> (-44.25, 120.8) projected
  line L34 (-44.25, 120.8) -> (-41.25, 120.8) projected
  line L35 (-41.25, 120.8) -> (-41.25, 114.8) projected
  line L36 (-62.625, 94.8) -> (-65.625, 94.8) projected
  line L37 (-65.625, 94.8) -> (-65.625, 100.8) projected
  line L38 (-65.625, 100.8) -> (-62.625, 100.8) projected
  line L39 (-62.625, 100.8) -> (-62.625, 94.8) projected
  line L40 (-62.625, 74.8) -> (-65.625, 74.8) projected
  line L41 (-65.625, 74.8) -> (-65.625, 80.8) projected
  line L42 (-65.625, 80.8) -> (-62.625, 80.8) projected
  line L43 (-62.625, 80.8) -> (-62.625, 74.8) projected
  line L44 (-19.875, 54.8) -> (-22.875, 54.8) projected
  line L45 (-22.875, 54.8) -> (-22.875, 60.8) projected
  line L46 (-22.875, 60.8) -> (-19.875, 60.8) projected
  line L47 (-19.875, 60.8) -> (-19.875, 54.8) projected
  line L48 (-62.625, 14.8) -> (-65.625, 14.8) projected
  line L49 (-65.625, 14.8) -> (-65.625, 20.8) projected
  line L50 (-65.625, 20.8) -> (-62.625, 20.8) projected
  line L51 (-62.625, 20.8) -> (-62.625, 14.8) projected
  line L52 (-41.25, 14.8) -> (-44.25, 14.8) projected
  line L53 (-44.25, 14.8) -> (-44.25, 20.8) projected
  line L54 (-44.25, 20.8) -> (-41.25, 20.8) projected
  line L55 (-41.25, 20.8) -> (-41.25, 14.8) projected
  line L56 (-62.625, 34.8) -> (-65.625, 34.8) projected
  line L57 (-65.625, 34.8) -> (-65.625, 40.8) projected
  line L58 (-65.625, 40.8) -> (-62.625, 40.8) projected
  line L59 (-62.625, 40.8) -> (-62.625, 34.8) projected
  line L60 (-41.25, 74.8) -> (-44.25, 74.8) projected
  line L61 (-44.25, 74.8) -> (-44.25, 80.8) projected
  line L62 (-44.25, 80.8) -> (-41.25, 80.8) projected
  line L63 (-41.25, 80.8) -> (-41.25, 74.8) projected
  line L64 (-44.25, 100.8) -> (-41.25, 100.8) projected
  line L65 (-41.25, 100.8) -> (-41.25, 94.8) projected
  line L66 (-41.25, 94.8) -> (-44.25, 94.8) projected
  line L67 (-44.25, 94.8) -> (-44.25, 100.8) projected
  line L68 (-62.625, 114.8) -> (-65.625, 114.8) projected
  line L69 (-65.625, 114.8) -> (-65.625, 120.8) projected
  line L70 (-65.625, 120.8) -> (-62.625, 120.8) projected
  line L71 (-62.625, 120.8) -> (-62.625, 114.8) projected
  line L72 (0, 127.8) -> (0, 0) projected
  line L73 (-85.5, 127.8) -> (0, 127.8) projected
  line L74 (-85.5, 0) -> (-85.5, 127.8) projected
  line L75 (0, 0) -> (-85.5, 0) projected
extrude "Extrusion28" add sketch "Sketch29" along normal blind 10
sketch "Sketch30" plane through (-85.5, 0, 0) normal (0, 0, 1) x (1, 0, 0)
  line L0 (0, 0) -> (0, 15) projected
  line L1 (0, 0) -> (85.5, 0) projected
  line L2 (85.5, 0) -> (85.5, 15) projected
  line L3 (0, 15) -> (85.5, 15) projected
extrude "Extrusion29" cut sketch "Sketch30" against normal blind 3.9
sketch "Sketch31" plane through (0, 0, -127.8) normal (0, 0, -1) x (-1, 0, 0)
  line L0 (0, 0) -> (0, 15) projected
  line L1 (0, 0) -> (85.5, 0) projected
  line L2 (85.5, 0) -> (85.5, 15) projected
  line L3 (0, 15) -> (85.5, 15) projected
extrude "Extrusion30" add sketch "Sketch31" along normal blind 3.9
sketch "Sketch32" plane through (0, 15, 0) normal (0, 1, 0) x (1, 0, 0)
  line L0 (-85.5, 3.9) -> (-85.5, 131.7) projected
  line L1 (-85.5, 3.9) -> (0, 3.9) projected
  line L2 (-85.5, 131.7) -> (-75.5, 131.7)
  line L3 (-75.5, 131.7) -> (-75.5, 3.9)
  line L4 (-75.5, 3.9) -> (-85.5, 3.9)
  line L5 (-85.5, 3.9) -> (-85.5, 131.7)
  line L6 (0, 3.9) -> (0, 131.7) projected
  line L7 (0, 131.7) -> (-10, 131.7)
  line L8 (-10, 131.7) -> (-10, 3.9)
  line L9 (-10, 3.9) -> (0, 3.9)
  line L10 (0, 3.9) -> (0, 131.7)
  point P0 (0, 0)
  point P1 (-10, 3.9)
  dimension "d140" = 10
  dimension "d141" = 10
extrude "Extrusion31" cut sketch "Sketch32" against normal blind 10
sketch "Sketch33" plane through (0, 15, 0) normal (0, 1, 0) x (1, 0, 0)
  line L0 (-65.625, 120.8) -> (-65.625, 114.8) projected
  line L1 (-65.625, 120.8) -> (-62.625, 120.8)
  line L2 (-62.625, 120.8) -> (-62.625, 122.8)
  line L3 (-62.625, 122.8) -> (-65.625, 122.8)
  line L4 (-65.625, 122.8) -> (-65.625, 120.8)
  line L5 (-65.625, 114.8) -> (-62.625, 114.8) projected
  line L6 (-65.625, 114.8) -> (-62.625, 114.8)
  line L7 (-62.625, 114.8) -> (-62.625, 112.8)
  line L8 (-62.625, 112.8) -> (-65.625, 112.8)
  line L9 (-65.625, 112.8) -> (-65.625, 114.8)
  line L10 (-41.25, 120.8) -> (-44.25, 120.8) projected
  line L11 (-44.25, 120.8) -> (-41.25, 120.8)
  line L12 (-41.25, 120.8) -> (-41.25, 122.8)
  line L13 (-41.25, 122.8) -> (-44.25, 122.8)
  line L14 (-44.25, 122.8) -> (-44.25, 120.8)
  line L15 (-19.875, 120.8) -> (-22.875, 120.8) projected
  line L16 (-22.875, 120.8) -> (-19.875, 120.8)
  line L17 (-19.875, 120.8) -> (-19.875, 122.8)
  line L18 (-19.875, 122.8) -> (-22.875, 122.8)
  line L19 (-22.875, 122.8) -> (-22.875, 120.8)
  line L20 (-44.25, 114.8) -> (-41.25, 114.8)
  line L21 (-41.25, 114.8) -> (-41.25, 112.8)
  line L22 (-41.25, 112.8) -> (-44.25, 112.8)
  line L23 (-44.25, 112.8) -> (-44.25, 114.8)
  line L24 (-22.875, 114.8) -> (-19.875, 114.8) projected
  line L25 (-22.875, 114.8) -> (-19.875, 114.8)
  line L26 (-19.875, 114.8) -> (-19.875, 112.8)
  line L27 (-19.875, 112.8) -> (-22.875, 112.8)
  line L28 (-22.875, 112.8) -> (-22.875, 114.8)
  line L29 (-62.625, 100.8) -> (-65.625, 100.8) projected
  line L30 (-65.625, 100.8) -> (-62.625, 100.8)
  line L31 (-62.625, 100.8) -> (-62.625, 102.8)
  line L32 (-62.625, 102.8) -> (-65.625, 102.8)
  line L33 (-65.625, 102.8) -> (-65.625, 100.8)
  line L34 (-65.625, 94.8) -> (-62.625, 94.8) projected
  line L35 (-65.625, 94.8) -> (-62.625, 94.8)
  line L36 (-62.625, 94.8) -> (-62.625, 92.8)
  line L37 (-62.625, 92.8) -> (-65.625, 92.8)
  line L38 (-65.625, 92.8) -> (-65.625, 94.8)
  line L39 (-44.25, 100.8) -> (-44.25, 94.8) projected
  line L40 (-44.25, 100.8) -> (-41.25, 100.8)
  line L41 (-41.25, 100.8) -> (-41.25, 102.8)
  line L42 (-41.25, 102.8) -> (-44.25, 102.8)
  line L43 (-44.25, 102.8) -> (-44.25, 100.8)
  line L44 (-44.25, 94.8) -> (-41.25, 94.8)
  line L45 (-41.25, 94.8) -> (-41.25, 92.8)
  line L46 (-41.25, 92.8) -> (-44.25, 92.8)
  line L47 (-44.25, 92.8) -> (-44.25, 94.8)
  line L48 (-22.875, 100.8) -> (-22.875, 94.8) projected
  line L49 (-22.875, 100.8) -> (-19.875, 100.8)
  line L50 (-19.875, 100.8) -> (-19.875, 102.8)
  line L51 (-19.875, 102.8) -> (-22.875, 102.8)
  line L52 (-22.875, 102.8) -> (-22.875, 100.8)
  line L53 (-22.875, 94.8) -> (-19.875, 94.8)
  line L54 (-19.875, 94.8) -> (-19.875, 92.8)
  line L55 (-19.875, 92.8) -> (-22.875, 92.8)
  line L56 (-22.875, 92.8) -> (-22.875, 94.8)
  line L57 (-65.625, 80.8) -> (-65.625, 74.8) projected
  line L58 (-65.625, 80.8) -> (-62.625, 80.8)
  line L59 (-62.625, 80.8) -> (-62.625, 82.8)
  line L60 (-62.625, 82.8) -> (-65.625, 82.8)
  line L61 (-65.625, 82.8) -> (-65.625, 80.8)
  line L62 (-65.625, 74.8) -> (-62.625, 74.8)
  line L63 (-62.625, 74.8) -> (-62.625, 72.8)
  line L64 (-62.625, 72.8) -> (-65.625, 72.8)
  line L65 (-65.625, 72.8) -> (-65.625, 74.8)
  line L66 (-41.25, 80.8) -> (-44.25, 80.8) projected
  line L67 (-44.25, 80.8) -> (-41.25, 80.8)
  line L68 (-41.25, 80.8) -> (-41.25, 82.8)
  line L69 (-41.25, 82.8) -> (-44.25, 82.8)
  line L70 (-44.25, 82.8) -> (-44.25, 80.8)
  line L71 (-44.25, 80.8) -> (-44.25, 74.8) projected
  line L72 (-44.25, 74.8) -> (-41.25, 74.8)
  line L73 (-41.25, 74.8) -> (-41.25, 72.8)
  line L74 (-41.25, 72.8) -> (-44.25, 72.8)
  line L75 (-44.25, 72.8) -> (-44.25, 74.8)
  line L76 (-19.875, 80.8) -> (-22.875, 80.8) projected
  line L77 (-22.875, 80.8) -> (-19.875, 80.8)
  line L78 (-19.875, 80.8) -> (-19.875, 82.8)
  line L79 (-19.875, 82.8) -> (-22.875, 82.8)
  line L80 (-22.875, 82.8) -> (-22.875, 80.8)
  line L81 (-22.875, 74.8) -> (-19.875, 74.8) projected
  line L82 (-22.875, 74.8) -> (-19.875, 74.8)
  line L83 (-19.875, 74.8) -> (-19.875, 72.8)
  line L84 (-19.875, 72.8) -> (-22.875, 72.8)
  line L85 (-22.875, 72.8) -> (-22.875, 74.8)
  line L86 (-62.625, 60.8) -> (-65.625, 60.8) projected
  line L87 (-65.625, 60.8) -> (-62.625, 60.8)
  line L88 (-62.625, 60.8) -> (-62.625, 62.8)
  line L89 (-62.625, 62.8) -> (-65.625, 62.8)
  line L90 (-65.625, 62.8) -> (-65.625, 60.8)
  line L91 (-65.625, 54.8) -> (-65.625, 60.8) projected
  line L92 (-65.625, 54.8) -> (-62.625, 54.8)
  line L93 (-62.625, 54.8) -> (-62.625, 52.8)
  line L94 (-62.625, 52.8) -> (-65.625, 52.8)
  line L95 (-65.625, 52.8) -> (-65.625, 54.8)
  line L96 (-62.625, 40.8) -> (-65.625, 40.8) projected
  line L97 (-65.625, 40.8) -> (-62.625, 40.8)
  line L98 (-62.625, 40.8) -> (-62.625, 42.8)
  line L99 (-62.625, 42.8) -> (-65.625, 42.8)
  line L100 (-65.625, 42.8) -> (-65.625, 40.8)
  line L101 (-65.625, 34.8) -> (-62.625, 34.8) projected
  line L102 (-65.625, 34.8) -> (-62.625, 34.8)
  line L103 (-62.625, 34.8) -> (-62.625, 32.8)
  line L104 (-62.625, 32.8) -> (-65.625, 32.8)
  line L105 (-65.625, 32.8) -> (-65.625, 34.8)
  line L106 (-65.625, 20.8) -> (-62.625, 20.8)
  line L107 (-62.625, 20.8) -> (-62.625, 22.8)
  line L108 (-62.625, 22.8) -> (-65.625, 22.8)
  line L109 (-65.625, 22.8) -> (-65.625, 20.8)
  line L110 (-65.625, 14.8) -> (-62.625, 14.8) projected
  line L111 (-65.625, 14.8) -> (-62.625, 14.8)
  line L112 (-62.625, 14.8) -> (-62.625, 12.8)
  line L113 (-62.625, 12.8) -> (-65.625, 12.8)
  line L114 (-65.625, 12.8) -> (-65.625, 14.8)
  line L115 (-44.25, 54.8) -> (-44.25, 60.8) projected
  line L116 (-44.25, 60.8) -> (-41.25, 60.8)
  line L117 (-41.25, 60.8) -> (-41.25, 62.8)
  line L118 (-41.25, 62.8) -> (-44.25, 62.8)
  line L119 (-44.25, 62.8) -> (-44.25, 60.8)
  line L120 (-41.25, 54.8) -> (-44.25, 54.8) projected
  line L121 (-44.25, 54.8) -> (-41.25, 54.8)
  line L122 (-41.25, 54.8) -> (-41.25, 52.8)
  line L123 (-41.25, 52.8) -> (-44.25, 52.8)
  line L124 (-44.25, 52.8) -> (-44.25, 54.8)
  line L125 (-19.875, 60.8) -> (-22.875, 60.8) projected
  line L126 (-22.875, 60.8) -> (-19.875, 60.8)
  line L127 (-19.875, 60.8) -> (-19.875, 62.8)
  line L128 (-19.875, 62.8) -> (-22.875, 62.8)
  line L129 (-22.875, 62.8) -> (-22.875, 60.8)
  line L130 (-19.875, 54.8) -> (-22.875, 54.8) projected
  line L131 (-22.875, 54.8) -> (-19.875, 54.8)
  line L132 (-19.875, 54.8) -> (-19.875, 52.8)
  line L133 (-19.875, 52.8) -> (-22.875, 52.8)
  line L134 (-22.875, 52.8) -> (-22.875, 54.8)
  line L135 (-44.25, 40.8) -> (-41.25, 40.8) projected
  line L136 (-44.25, 40.8) -> (-41.25, 40.8)
  line L137 (-41.25, 40.8) -> (-41.25, 42.8)
  line L138 (-41.25, 42.8) -> (-44.25, 42.8)
  line L139 (-44.25, 42.8) -> (-44.25, 40.8)
  line L140 (-44.25, 34.8) -> (-41.25, 34.8)
  line L141 (-41.25, 34.8) -> (-41.25, 32.8)
  line L142 (-41.25, 32.8) -> (-44.25, 32.8)
  line L143 (-44.25, 32.8) -> (-44.25, 34.8)
  line L144 (-44.25, 20.8) -> (-44.25, 14.8) projected
  line L145 (-44.25, 20.8) -> (-41.25, 20.8)
  line L146 (-41.25, 20.8) -> (-41.25, 22.8)
  line L147 (-41.25, 22.8) -> (-44.25, 22.8)
  line L148 (-44.25, 22.8) -> (-44.25, 20.8)
  line L149 (-44.25, 14.8) -> (-41.25, 14.8)
  line L150 (-41.25, 14.8) -> (-41.25, 12.8)
  line L151 (-41.25, 12.8) -> (-44.25, 12.8)
  line L152 (-44.25, 12.8) -> (-44.25, 14.8)
  line L153 (-22.875, 20.8) -> (-22.875, 14.8) projected
  line L154 (-22.875, 20.8) -> (-19.875, 20.8)
  line L155 (-19.875, 20.8) -> (-19.875, 22.8)
  line L156 (-19.875, 22.8) -> (-22.875, 22.8)
  line L157 (-22.875, 22.8) -> (-22.875, 20.8)
  line L158 (-22.875, 14.8) -> (-19.875, 14.8)
  line L159 (-19.875, 14.8) -> (-19.875, 12.8)
  line L160 (-19.875, 12.8) -> (-22.875, 12.8)
  line L161 (-22.875, 12.8) -> (-22.875, 14.8)
  line L162 (-22.875, 40.8) -> (-19.875, 40.8)
  line L163 (-19.875, 40.8) -> (-19.875, 42.8)
  line L164 (-19.875, 42.8) -> (-22.875, 42.8)
  line L165 (-22.875, 42.8) -> (-22.875, 40.8)
  line L166 (-22.875, 34.8) -> (-19.875, 34.8)
  line L167 (-19.875, 34.8) -> (-19.875, 32.8)
  line L168 (-19.875, 32.8) -> (-22.875, 32.8)
  line L169 (-22.875, 32.8) -> (-22.875, 34.8)
  point P0 (0, 0)
  dimension "d144" = 3
  dimension "d145" = 2
  dimension "d146" = 3
  dimension "d147" = 2
  dimension "d148" = 2
  dimension "d149" = 2
  dimension "d150" = 2
  dimension "d151" = 2
  dimension "d152" = 2
  dimension "d153" = 2
  dimension "d154" = 2
  dimension "d155" = 3
  dimension "d156" = 2
  dimension "d157" = 2
  dimension "d158" = 2
  dimension "d159" = 2
  dimension "d160" = 2
extrude "Extrusion32" cut sketch "Sketch33" against normal blind 100
chamfer "Chamfer3" distance 5 angle 45 72 edges at (-62.625, 15, -117.8) (-62.625, 15, -97.8) (-62.625, 15, -77.8) (-62.625, 15, -57.8) (-62.625, 15, -37.8) (-62.625, 15, -17.8) (-65.625, 15, -117.8) (-65.625, 15, -97.8) (-65.625, 15, -77.8) (-65.625, 15, -57.8) (-65.625, 15, -37.8) (-65.625, 15, -17.8) (-44.25, 15, -117.8) (-44.25, 15, -97.8) (-44.25, 15, -77.8) (-44.25, 15, -57.8) (-44.25, 15, -37.8) (-44.25, 15, -17.8) (-41.25, 15, -117.8) (-41.25, 15, -97.8) (-41.25, 15, -77.8) (-41.25, 15, -57.8) (-41.25, 15, -37.8) (-41.25, 15, -17.8) (-22.875, 15, -117.8) (-22.875, 15, -97.8) (-22.875, 15, -77.8) (-22.875, 15, -57.8) (-22.875, 15, -37.8) (-22.875, 15, -17.8) (-19.875, 15, -117.8) (-19.875, 15, -97.8) (-19.875, 15, -77.8) (-19.875, 15, -57.8) (-19.875, 15, -37.8) (-19.875, 15, -17.8) (-64.125, 15, -22.8) (-64.125, 15, -12.8) (-42.75, 15, -22.8) (-42.75, 15, -12.8) (-64.125, 15, -32.8) (-64.125, 15, -42.8) (-64.125, 15, -52.8) (-42.75, 15, -32.8) (-42.75, 15, -42.8) (-42.75, 15, -62.8) (-64.125, 15, -62.8) (-42.75, 15, -52.8) (-21.375, 15, -42.8) (-21.375, 15, -22.8) (-21.375, 15, -12.8) (-21.375, 15, -32.8) (-21.375, 15, -62.8) (-21.375, 15, -52.8) (-21.375, 15, -82.8) (-21.375, 15, -72.8) (-42.75, 15, -82.8) (-42.75, 15, -72.8) (-64.125, 15, -82.8) (-64.125, 15, -72.8) (-64.125, 15, -92.8) (-64.125, 15, -102.8) (-64.125, 15, -112.8) (-64.125, 15, -122.8) (-42.75, 15, -122.8) (-42.75, 15, -112.8) (-42.75, 15, -102.8) (-42.75, 15, -92.8) (-21.375, 15, -92.8) (-21.375, 15, -102.8) (-21.375, 15, -112.8) (-21.375, 15, -122.8)
sketch "Sketch34" plane through (0, 15, 0) normal (0, 1, 0) x (1, 0, 0)
  point P0 (0, 0)
sketch "Sketch35" plane through (0, 15, 0) normal (0, 1, 0) x (1, 0, 0)
  line L0 (-75.5, 131.7) -> (-75.5, 3.9) projected
  line L1 (0, 3.9) -> (-10, 3.9) projected
  line L2 (-75.5, 131.7) -> (-10, 131.7)
  line L3 (-10, 131.7) -> (-10, 3.9)
  line L4 (-10, 3.9) -> (-75.5, 3.9)
  line L5 (-75.5, 3.9) -> (-75.5, 131.7)
  point P0 (0, 0)
extrude "Extrusion33" add sketch "Sketch35" against normal blind 15
sketch "Sketch36" plane through (0, 15, 0) normal (0, 1, 0) x (1, 0, 0)
  line L0 (-10, 3.9) -> (-10, 131.7) projected
  line L1 (-10, 67.8) -> (-75.5, 67.8)
  line L2 (-75.5, 131.7) -> (-75.5, 3.9) projected
  line L3 (-75.5, 3.9) -> (-10, 3.9) projected
  line L4 (-42.75, 3.9) -> (-42.75, 67.8)
  line L5 (-42.75, 67.8) -> (-42.75, 131.7)
  line L6 (-75.5, 131.7) -> (-10, 131.7) projected
  circle A0 centre (-42.75, 99.75) radius 25.4
  circle A1 centre (-42.75, 35.85) radius 25.4
  point P0 (0, 0)
  dimension "d168" = 50.8
  dimension "d169" = 50.8
extrude "Extrusion34" cut sketch "Sketch36" against normal blind 15 contours A1 L4 | L4 A1 | A0 L5 | L5 A0
sketch "Sketch37" plane through (0, 15, 0) normal (0, 1, 0) x (1, 0, 0)
  circle A0 centre (-42.75, 99.75) radius 25.4 projected
  circle A1 centre (-42.75, 99.75) radius 27.9
  circle A2 centre (-42.75, 35.85) radius 25.4 projected
  circle A3 centre (-42.75, 35.85) radius 27.9
  line L0 (-10, 3.9) -> (-10, 131.7) projected
  line L1 (-75.5, 131.7) -> (-75.5, 3.9) projected
  line L2 (-10, 131.7) -> (-75.5, 131.7)
  line L3 (-75.5, 131.7) -> (-75.5, 3.9)
  line L4 (-75.5, 3.9) -> (-10, 3.9)
  line L5 (-10, 3.9) -> (-10, 131.7)
  point P0 (0, 0)
  dimension "d172" = 55.8
  dimension "d173" = 55.8
extrude "Extrusion35" cut sketch "Sketch37" against normal blind 10 contours L4 L1 L2 L0
properties part number "rinsing_station"
